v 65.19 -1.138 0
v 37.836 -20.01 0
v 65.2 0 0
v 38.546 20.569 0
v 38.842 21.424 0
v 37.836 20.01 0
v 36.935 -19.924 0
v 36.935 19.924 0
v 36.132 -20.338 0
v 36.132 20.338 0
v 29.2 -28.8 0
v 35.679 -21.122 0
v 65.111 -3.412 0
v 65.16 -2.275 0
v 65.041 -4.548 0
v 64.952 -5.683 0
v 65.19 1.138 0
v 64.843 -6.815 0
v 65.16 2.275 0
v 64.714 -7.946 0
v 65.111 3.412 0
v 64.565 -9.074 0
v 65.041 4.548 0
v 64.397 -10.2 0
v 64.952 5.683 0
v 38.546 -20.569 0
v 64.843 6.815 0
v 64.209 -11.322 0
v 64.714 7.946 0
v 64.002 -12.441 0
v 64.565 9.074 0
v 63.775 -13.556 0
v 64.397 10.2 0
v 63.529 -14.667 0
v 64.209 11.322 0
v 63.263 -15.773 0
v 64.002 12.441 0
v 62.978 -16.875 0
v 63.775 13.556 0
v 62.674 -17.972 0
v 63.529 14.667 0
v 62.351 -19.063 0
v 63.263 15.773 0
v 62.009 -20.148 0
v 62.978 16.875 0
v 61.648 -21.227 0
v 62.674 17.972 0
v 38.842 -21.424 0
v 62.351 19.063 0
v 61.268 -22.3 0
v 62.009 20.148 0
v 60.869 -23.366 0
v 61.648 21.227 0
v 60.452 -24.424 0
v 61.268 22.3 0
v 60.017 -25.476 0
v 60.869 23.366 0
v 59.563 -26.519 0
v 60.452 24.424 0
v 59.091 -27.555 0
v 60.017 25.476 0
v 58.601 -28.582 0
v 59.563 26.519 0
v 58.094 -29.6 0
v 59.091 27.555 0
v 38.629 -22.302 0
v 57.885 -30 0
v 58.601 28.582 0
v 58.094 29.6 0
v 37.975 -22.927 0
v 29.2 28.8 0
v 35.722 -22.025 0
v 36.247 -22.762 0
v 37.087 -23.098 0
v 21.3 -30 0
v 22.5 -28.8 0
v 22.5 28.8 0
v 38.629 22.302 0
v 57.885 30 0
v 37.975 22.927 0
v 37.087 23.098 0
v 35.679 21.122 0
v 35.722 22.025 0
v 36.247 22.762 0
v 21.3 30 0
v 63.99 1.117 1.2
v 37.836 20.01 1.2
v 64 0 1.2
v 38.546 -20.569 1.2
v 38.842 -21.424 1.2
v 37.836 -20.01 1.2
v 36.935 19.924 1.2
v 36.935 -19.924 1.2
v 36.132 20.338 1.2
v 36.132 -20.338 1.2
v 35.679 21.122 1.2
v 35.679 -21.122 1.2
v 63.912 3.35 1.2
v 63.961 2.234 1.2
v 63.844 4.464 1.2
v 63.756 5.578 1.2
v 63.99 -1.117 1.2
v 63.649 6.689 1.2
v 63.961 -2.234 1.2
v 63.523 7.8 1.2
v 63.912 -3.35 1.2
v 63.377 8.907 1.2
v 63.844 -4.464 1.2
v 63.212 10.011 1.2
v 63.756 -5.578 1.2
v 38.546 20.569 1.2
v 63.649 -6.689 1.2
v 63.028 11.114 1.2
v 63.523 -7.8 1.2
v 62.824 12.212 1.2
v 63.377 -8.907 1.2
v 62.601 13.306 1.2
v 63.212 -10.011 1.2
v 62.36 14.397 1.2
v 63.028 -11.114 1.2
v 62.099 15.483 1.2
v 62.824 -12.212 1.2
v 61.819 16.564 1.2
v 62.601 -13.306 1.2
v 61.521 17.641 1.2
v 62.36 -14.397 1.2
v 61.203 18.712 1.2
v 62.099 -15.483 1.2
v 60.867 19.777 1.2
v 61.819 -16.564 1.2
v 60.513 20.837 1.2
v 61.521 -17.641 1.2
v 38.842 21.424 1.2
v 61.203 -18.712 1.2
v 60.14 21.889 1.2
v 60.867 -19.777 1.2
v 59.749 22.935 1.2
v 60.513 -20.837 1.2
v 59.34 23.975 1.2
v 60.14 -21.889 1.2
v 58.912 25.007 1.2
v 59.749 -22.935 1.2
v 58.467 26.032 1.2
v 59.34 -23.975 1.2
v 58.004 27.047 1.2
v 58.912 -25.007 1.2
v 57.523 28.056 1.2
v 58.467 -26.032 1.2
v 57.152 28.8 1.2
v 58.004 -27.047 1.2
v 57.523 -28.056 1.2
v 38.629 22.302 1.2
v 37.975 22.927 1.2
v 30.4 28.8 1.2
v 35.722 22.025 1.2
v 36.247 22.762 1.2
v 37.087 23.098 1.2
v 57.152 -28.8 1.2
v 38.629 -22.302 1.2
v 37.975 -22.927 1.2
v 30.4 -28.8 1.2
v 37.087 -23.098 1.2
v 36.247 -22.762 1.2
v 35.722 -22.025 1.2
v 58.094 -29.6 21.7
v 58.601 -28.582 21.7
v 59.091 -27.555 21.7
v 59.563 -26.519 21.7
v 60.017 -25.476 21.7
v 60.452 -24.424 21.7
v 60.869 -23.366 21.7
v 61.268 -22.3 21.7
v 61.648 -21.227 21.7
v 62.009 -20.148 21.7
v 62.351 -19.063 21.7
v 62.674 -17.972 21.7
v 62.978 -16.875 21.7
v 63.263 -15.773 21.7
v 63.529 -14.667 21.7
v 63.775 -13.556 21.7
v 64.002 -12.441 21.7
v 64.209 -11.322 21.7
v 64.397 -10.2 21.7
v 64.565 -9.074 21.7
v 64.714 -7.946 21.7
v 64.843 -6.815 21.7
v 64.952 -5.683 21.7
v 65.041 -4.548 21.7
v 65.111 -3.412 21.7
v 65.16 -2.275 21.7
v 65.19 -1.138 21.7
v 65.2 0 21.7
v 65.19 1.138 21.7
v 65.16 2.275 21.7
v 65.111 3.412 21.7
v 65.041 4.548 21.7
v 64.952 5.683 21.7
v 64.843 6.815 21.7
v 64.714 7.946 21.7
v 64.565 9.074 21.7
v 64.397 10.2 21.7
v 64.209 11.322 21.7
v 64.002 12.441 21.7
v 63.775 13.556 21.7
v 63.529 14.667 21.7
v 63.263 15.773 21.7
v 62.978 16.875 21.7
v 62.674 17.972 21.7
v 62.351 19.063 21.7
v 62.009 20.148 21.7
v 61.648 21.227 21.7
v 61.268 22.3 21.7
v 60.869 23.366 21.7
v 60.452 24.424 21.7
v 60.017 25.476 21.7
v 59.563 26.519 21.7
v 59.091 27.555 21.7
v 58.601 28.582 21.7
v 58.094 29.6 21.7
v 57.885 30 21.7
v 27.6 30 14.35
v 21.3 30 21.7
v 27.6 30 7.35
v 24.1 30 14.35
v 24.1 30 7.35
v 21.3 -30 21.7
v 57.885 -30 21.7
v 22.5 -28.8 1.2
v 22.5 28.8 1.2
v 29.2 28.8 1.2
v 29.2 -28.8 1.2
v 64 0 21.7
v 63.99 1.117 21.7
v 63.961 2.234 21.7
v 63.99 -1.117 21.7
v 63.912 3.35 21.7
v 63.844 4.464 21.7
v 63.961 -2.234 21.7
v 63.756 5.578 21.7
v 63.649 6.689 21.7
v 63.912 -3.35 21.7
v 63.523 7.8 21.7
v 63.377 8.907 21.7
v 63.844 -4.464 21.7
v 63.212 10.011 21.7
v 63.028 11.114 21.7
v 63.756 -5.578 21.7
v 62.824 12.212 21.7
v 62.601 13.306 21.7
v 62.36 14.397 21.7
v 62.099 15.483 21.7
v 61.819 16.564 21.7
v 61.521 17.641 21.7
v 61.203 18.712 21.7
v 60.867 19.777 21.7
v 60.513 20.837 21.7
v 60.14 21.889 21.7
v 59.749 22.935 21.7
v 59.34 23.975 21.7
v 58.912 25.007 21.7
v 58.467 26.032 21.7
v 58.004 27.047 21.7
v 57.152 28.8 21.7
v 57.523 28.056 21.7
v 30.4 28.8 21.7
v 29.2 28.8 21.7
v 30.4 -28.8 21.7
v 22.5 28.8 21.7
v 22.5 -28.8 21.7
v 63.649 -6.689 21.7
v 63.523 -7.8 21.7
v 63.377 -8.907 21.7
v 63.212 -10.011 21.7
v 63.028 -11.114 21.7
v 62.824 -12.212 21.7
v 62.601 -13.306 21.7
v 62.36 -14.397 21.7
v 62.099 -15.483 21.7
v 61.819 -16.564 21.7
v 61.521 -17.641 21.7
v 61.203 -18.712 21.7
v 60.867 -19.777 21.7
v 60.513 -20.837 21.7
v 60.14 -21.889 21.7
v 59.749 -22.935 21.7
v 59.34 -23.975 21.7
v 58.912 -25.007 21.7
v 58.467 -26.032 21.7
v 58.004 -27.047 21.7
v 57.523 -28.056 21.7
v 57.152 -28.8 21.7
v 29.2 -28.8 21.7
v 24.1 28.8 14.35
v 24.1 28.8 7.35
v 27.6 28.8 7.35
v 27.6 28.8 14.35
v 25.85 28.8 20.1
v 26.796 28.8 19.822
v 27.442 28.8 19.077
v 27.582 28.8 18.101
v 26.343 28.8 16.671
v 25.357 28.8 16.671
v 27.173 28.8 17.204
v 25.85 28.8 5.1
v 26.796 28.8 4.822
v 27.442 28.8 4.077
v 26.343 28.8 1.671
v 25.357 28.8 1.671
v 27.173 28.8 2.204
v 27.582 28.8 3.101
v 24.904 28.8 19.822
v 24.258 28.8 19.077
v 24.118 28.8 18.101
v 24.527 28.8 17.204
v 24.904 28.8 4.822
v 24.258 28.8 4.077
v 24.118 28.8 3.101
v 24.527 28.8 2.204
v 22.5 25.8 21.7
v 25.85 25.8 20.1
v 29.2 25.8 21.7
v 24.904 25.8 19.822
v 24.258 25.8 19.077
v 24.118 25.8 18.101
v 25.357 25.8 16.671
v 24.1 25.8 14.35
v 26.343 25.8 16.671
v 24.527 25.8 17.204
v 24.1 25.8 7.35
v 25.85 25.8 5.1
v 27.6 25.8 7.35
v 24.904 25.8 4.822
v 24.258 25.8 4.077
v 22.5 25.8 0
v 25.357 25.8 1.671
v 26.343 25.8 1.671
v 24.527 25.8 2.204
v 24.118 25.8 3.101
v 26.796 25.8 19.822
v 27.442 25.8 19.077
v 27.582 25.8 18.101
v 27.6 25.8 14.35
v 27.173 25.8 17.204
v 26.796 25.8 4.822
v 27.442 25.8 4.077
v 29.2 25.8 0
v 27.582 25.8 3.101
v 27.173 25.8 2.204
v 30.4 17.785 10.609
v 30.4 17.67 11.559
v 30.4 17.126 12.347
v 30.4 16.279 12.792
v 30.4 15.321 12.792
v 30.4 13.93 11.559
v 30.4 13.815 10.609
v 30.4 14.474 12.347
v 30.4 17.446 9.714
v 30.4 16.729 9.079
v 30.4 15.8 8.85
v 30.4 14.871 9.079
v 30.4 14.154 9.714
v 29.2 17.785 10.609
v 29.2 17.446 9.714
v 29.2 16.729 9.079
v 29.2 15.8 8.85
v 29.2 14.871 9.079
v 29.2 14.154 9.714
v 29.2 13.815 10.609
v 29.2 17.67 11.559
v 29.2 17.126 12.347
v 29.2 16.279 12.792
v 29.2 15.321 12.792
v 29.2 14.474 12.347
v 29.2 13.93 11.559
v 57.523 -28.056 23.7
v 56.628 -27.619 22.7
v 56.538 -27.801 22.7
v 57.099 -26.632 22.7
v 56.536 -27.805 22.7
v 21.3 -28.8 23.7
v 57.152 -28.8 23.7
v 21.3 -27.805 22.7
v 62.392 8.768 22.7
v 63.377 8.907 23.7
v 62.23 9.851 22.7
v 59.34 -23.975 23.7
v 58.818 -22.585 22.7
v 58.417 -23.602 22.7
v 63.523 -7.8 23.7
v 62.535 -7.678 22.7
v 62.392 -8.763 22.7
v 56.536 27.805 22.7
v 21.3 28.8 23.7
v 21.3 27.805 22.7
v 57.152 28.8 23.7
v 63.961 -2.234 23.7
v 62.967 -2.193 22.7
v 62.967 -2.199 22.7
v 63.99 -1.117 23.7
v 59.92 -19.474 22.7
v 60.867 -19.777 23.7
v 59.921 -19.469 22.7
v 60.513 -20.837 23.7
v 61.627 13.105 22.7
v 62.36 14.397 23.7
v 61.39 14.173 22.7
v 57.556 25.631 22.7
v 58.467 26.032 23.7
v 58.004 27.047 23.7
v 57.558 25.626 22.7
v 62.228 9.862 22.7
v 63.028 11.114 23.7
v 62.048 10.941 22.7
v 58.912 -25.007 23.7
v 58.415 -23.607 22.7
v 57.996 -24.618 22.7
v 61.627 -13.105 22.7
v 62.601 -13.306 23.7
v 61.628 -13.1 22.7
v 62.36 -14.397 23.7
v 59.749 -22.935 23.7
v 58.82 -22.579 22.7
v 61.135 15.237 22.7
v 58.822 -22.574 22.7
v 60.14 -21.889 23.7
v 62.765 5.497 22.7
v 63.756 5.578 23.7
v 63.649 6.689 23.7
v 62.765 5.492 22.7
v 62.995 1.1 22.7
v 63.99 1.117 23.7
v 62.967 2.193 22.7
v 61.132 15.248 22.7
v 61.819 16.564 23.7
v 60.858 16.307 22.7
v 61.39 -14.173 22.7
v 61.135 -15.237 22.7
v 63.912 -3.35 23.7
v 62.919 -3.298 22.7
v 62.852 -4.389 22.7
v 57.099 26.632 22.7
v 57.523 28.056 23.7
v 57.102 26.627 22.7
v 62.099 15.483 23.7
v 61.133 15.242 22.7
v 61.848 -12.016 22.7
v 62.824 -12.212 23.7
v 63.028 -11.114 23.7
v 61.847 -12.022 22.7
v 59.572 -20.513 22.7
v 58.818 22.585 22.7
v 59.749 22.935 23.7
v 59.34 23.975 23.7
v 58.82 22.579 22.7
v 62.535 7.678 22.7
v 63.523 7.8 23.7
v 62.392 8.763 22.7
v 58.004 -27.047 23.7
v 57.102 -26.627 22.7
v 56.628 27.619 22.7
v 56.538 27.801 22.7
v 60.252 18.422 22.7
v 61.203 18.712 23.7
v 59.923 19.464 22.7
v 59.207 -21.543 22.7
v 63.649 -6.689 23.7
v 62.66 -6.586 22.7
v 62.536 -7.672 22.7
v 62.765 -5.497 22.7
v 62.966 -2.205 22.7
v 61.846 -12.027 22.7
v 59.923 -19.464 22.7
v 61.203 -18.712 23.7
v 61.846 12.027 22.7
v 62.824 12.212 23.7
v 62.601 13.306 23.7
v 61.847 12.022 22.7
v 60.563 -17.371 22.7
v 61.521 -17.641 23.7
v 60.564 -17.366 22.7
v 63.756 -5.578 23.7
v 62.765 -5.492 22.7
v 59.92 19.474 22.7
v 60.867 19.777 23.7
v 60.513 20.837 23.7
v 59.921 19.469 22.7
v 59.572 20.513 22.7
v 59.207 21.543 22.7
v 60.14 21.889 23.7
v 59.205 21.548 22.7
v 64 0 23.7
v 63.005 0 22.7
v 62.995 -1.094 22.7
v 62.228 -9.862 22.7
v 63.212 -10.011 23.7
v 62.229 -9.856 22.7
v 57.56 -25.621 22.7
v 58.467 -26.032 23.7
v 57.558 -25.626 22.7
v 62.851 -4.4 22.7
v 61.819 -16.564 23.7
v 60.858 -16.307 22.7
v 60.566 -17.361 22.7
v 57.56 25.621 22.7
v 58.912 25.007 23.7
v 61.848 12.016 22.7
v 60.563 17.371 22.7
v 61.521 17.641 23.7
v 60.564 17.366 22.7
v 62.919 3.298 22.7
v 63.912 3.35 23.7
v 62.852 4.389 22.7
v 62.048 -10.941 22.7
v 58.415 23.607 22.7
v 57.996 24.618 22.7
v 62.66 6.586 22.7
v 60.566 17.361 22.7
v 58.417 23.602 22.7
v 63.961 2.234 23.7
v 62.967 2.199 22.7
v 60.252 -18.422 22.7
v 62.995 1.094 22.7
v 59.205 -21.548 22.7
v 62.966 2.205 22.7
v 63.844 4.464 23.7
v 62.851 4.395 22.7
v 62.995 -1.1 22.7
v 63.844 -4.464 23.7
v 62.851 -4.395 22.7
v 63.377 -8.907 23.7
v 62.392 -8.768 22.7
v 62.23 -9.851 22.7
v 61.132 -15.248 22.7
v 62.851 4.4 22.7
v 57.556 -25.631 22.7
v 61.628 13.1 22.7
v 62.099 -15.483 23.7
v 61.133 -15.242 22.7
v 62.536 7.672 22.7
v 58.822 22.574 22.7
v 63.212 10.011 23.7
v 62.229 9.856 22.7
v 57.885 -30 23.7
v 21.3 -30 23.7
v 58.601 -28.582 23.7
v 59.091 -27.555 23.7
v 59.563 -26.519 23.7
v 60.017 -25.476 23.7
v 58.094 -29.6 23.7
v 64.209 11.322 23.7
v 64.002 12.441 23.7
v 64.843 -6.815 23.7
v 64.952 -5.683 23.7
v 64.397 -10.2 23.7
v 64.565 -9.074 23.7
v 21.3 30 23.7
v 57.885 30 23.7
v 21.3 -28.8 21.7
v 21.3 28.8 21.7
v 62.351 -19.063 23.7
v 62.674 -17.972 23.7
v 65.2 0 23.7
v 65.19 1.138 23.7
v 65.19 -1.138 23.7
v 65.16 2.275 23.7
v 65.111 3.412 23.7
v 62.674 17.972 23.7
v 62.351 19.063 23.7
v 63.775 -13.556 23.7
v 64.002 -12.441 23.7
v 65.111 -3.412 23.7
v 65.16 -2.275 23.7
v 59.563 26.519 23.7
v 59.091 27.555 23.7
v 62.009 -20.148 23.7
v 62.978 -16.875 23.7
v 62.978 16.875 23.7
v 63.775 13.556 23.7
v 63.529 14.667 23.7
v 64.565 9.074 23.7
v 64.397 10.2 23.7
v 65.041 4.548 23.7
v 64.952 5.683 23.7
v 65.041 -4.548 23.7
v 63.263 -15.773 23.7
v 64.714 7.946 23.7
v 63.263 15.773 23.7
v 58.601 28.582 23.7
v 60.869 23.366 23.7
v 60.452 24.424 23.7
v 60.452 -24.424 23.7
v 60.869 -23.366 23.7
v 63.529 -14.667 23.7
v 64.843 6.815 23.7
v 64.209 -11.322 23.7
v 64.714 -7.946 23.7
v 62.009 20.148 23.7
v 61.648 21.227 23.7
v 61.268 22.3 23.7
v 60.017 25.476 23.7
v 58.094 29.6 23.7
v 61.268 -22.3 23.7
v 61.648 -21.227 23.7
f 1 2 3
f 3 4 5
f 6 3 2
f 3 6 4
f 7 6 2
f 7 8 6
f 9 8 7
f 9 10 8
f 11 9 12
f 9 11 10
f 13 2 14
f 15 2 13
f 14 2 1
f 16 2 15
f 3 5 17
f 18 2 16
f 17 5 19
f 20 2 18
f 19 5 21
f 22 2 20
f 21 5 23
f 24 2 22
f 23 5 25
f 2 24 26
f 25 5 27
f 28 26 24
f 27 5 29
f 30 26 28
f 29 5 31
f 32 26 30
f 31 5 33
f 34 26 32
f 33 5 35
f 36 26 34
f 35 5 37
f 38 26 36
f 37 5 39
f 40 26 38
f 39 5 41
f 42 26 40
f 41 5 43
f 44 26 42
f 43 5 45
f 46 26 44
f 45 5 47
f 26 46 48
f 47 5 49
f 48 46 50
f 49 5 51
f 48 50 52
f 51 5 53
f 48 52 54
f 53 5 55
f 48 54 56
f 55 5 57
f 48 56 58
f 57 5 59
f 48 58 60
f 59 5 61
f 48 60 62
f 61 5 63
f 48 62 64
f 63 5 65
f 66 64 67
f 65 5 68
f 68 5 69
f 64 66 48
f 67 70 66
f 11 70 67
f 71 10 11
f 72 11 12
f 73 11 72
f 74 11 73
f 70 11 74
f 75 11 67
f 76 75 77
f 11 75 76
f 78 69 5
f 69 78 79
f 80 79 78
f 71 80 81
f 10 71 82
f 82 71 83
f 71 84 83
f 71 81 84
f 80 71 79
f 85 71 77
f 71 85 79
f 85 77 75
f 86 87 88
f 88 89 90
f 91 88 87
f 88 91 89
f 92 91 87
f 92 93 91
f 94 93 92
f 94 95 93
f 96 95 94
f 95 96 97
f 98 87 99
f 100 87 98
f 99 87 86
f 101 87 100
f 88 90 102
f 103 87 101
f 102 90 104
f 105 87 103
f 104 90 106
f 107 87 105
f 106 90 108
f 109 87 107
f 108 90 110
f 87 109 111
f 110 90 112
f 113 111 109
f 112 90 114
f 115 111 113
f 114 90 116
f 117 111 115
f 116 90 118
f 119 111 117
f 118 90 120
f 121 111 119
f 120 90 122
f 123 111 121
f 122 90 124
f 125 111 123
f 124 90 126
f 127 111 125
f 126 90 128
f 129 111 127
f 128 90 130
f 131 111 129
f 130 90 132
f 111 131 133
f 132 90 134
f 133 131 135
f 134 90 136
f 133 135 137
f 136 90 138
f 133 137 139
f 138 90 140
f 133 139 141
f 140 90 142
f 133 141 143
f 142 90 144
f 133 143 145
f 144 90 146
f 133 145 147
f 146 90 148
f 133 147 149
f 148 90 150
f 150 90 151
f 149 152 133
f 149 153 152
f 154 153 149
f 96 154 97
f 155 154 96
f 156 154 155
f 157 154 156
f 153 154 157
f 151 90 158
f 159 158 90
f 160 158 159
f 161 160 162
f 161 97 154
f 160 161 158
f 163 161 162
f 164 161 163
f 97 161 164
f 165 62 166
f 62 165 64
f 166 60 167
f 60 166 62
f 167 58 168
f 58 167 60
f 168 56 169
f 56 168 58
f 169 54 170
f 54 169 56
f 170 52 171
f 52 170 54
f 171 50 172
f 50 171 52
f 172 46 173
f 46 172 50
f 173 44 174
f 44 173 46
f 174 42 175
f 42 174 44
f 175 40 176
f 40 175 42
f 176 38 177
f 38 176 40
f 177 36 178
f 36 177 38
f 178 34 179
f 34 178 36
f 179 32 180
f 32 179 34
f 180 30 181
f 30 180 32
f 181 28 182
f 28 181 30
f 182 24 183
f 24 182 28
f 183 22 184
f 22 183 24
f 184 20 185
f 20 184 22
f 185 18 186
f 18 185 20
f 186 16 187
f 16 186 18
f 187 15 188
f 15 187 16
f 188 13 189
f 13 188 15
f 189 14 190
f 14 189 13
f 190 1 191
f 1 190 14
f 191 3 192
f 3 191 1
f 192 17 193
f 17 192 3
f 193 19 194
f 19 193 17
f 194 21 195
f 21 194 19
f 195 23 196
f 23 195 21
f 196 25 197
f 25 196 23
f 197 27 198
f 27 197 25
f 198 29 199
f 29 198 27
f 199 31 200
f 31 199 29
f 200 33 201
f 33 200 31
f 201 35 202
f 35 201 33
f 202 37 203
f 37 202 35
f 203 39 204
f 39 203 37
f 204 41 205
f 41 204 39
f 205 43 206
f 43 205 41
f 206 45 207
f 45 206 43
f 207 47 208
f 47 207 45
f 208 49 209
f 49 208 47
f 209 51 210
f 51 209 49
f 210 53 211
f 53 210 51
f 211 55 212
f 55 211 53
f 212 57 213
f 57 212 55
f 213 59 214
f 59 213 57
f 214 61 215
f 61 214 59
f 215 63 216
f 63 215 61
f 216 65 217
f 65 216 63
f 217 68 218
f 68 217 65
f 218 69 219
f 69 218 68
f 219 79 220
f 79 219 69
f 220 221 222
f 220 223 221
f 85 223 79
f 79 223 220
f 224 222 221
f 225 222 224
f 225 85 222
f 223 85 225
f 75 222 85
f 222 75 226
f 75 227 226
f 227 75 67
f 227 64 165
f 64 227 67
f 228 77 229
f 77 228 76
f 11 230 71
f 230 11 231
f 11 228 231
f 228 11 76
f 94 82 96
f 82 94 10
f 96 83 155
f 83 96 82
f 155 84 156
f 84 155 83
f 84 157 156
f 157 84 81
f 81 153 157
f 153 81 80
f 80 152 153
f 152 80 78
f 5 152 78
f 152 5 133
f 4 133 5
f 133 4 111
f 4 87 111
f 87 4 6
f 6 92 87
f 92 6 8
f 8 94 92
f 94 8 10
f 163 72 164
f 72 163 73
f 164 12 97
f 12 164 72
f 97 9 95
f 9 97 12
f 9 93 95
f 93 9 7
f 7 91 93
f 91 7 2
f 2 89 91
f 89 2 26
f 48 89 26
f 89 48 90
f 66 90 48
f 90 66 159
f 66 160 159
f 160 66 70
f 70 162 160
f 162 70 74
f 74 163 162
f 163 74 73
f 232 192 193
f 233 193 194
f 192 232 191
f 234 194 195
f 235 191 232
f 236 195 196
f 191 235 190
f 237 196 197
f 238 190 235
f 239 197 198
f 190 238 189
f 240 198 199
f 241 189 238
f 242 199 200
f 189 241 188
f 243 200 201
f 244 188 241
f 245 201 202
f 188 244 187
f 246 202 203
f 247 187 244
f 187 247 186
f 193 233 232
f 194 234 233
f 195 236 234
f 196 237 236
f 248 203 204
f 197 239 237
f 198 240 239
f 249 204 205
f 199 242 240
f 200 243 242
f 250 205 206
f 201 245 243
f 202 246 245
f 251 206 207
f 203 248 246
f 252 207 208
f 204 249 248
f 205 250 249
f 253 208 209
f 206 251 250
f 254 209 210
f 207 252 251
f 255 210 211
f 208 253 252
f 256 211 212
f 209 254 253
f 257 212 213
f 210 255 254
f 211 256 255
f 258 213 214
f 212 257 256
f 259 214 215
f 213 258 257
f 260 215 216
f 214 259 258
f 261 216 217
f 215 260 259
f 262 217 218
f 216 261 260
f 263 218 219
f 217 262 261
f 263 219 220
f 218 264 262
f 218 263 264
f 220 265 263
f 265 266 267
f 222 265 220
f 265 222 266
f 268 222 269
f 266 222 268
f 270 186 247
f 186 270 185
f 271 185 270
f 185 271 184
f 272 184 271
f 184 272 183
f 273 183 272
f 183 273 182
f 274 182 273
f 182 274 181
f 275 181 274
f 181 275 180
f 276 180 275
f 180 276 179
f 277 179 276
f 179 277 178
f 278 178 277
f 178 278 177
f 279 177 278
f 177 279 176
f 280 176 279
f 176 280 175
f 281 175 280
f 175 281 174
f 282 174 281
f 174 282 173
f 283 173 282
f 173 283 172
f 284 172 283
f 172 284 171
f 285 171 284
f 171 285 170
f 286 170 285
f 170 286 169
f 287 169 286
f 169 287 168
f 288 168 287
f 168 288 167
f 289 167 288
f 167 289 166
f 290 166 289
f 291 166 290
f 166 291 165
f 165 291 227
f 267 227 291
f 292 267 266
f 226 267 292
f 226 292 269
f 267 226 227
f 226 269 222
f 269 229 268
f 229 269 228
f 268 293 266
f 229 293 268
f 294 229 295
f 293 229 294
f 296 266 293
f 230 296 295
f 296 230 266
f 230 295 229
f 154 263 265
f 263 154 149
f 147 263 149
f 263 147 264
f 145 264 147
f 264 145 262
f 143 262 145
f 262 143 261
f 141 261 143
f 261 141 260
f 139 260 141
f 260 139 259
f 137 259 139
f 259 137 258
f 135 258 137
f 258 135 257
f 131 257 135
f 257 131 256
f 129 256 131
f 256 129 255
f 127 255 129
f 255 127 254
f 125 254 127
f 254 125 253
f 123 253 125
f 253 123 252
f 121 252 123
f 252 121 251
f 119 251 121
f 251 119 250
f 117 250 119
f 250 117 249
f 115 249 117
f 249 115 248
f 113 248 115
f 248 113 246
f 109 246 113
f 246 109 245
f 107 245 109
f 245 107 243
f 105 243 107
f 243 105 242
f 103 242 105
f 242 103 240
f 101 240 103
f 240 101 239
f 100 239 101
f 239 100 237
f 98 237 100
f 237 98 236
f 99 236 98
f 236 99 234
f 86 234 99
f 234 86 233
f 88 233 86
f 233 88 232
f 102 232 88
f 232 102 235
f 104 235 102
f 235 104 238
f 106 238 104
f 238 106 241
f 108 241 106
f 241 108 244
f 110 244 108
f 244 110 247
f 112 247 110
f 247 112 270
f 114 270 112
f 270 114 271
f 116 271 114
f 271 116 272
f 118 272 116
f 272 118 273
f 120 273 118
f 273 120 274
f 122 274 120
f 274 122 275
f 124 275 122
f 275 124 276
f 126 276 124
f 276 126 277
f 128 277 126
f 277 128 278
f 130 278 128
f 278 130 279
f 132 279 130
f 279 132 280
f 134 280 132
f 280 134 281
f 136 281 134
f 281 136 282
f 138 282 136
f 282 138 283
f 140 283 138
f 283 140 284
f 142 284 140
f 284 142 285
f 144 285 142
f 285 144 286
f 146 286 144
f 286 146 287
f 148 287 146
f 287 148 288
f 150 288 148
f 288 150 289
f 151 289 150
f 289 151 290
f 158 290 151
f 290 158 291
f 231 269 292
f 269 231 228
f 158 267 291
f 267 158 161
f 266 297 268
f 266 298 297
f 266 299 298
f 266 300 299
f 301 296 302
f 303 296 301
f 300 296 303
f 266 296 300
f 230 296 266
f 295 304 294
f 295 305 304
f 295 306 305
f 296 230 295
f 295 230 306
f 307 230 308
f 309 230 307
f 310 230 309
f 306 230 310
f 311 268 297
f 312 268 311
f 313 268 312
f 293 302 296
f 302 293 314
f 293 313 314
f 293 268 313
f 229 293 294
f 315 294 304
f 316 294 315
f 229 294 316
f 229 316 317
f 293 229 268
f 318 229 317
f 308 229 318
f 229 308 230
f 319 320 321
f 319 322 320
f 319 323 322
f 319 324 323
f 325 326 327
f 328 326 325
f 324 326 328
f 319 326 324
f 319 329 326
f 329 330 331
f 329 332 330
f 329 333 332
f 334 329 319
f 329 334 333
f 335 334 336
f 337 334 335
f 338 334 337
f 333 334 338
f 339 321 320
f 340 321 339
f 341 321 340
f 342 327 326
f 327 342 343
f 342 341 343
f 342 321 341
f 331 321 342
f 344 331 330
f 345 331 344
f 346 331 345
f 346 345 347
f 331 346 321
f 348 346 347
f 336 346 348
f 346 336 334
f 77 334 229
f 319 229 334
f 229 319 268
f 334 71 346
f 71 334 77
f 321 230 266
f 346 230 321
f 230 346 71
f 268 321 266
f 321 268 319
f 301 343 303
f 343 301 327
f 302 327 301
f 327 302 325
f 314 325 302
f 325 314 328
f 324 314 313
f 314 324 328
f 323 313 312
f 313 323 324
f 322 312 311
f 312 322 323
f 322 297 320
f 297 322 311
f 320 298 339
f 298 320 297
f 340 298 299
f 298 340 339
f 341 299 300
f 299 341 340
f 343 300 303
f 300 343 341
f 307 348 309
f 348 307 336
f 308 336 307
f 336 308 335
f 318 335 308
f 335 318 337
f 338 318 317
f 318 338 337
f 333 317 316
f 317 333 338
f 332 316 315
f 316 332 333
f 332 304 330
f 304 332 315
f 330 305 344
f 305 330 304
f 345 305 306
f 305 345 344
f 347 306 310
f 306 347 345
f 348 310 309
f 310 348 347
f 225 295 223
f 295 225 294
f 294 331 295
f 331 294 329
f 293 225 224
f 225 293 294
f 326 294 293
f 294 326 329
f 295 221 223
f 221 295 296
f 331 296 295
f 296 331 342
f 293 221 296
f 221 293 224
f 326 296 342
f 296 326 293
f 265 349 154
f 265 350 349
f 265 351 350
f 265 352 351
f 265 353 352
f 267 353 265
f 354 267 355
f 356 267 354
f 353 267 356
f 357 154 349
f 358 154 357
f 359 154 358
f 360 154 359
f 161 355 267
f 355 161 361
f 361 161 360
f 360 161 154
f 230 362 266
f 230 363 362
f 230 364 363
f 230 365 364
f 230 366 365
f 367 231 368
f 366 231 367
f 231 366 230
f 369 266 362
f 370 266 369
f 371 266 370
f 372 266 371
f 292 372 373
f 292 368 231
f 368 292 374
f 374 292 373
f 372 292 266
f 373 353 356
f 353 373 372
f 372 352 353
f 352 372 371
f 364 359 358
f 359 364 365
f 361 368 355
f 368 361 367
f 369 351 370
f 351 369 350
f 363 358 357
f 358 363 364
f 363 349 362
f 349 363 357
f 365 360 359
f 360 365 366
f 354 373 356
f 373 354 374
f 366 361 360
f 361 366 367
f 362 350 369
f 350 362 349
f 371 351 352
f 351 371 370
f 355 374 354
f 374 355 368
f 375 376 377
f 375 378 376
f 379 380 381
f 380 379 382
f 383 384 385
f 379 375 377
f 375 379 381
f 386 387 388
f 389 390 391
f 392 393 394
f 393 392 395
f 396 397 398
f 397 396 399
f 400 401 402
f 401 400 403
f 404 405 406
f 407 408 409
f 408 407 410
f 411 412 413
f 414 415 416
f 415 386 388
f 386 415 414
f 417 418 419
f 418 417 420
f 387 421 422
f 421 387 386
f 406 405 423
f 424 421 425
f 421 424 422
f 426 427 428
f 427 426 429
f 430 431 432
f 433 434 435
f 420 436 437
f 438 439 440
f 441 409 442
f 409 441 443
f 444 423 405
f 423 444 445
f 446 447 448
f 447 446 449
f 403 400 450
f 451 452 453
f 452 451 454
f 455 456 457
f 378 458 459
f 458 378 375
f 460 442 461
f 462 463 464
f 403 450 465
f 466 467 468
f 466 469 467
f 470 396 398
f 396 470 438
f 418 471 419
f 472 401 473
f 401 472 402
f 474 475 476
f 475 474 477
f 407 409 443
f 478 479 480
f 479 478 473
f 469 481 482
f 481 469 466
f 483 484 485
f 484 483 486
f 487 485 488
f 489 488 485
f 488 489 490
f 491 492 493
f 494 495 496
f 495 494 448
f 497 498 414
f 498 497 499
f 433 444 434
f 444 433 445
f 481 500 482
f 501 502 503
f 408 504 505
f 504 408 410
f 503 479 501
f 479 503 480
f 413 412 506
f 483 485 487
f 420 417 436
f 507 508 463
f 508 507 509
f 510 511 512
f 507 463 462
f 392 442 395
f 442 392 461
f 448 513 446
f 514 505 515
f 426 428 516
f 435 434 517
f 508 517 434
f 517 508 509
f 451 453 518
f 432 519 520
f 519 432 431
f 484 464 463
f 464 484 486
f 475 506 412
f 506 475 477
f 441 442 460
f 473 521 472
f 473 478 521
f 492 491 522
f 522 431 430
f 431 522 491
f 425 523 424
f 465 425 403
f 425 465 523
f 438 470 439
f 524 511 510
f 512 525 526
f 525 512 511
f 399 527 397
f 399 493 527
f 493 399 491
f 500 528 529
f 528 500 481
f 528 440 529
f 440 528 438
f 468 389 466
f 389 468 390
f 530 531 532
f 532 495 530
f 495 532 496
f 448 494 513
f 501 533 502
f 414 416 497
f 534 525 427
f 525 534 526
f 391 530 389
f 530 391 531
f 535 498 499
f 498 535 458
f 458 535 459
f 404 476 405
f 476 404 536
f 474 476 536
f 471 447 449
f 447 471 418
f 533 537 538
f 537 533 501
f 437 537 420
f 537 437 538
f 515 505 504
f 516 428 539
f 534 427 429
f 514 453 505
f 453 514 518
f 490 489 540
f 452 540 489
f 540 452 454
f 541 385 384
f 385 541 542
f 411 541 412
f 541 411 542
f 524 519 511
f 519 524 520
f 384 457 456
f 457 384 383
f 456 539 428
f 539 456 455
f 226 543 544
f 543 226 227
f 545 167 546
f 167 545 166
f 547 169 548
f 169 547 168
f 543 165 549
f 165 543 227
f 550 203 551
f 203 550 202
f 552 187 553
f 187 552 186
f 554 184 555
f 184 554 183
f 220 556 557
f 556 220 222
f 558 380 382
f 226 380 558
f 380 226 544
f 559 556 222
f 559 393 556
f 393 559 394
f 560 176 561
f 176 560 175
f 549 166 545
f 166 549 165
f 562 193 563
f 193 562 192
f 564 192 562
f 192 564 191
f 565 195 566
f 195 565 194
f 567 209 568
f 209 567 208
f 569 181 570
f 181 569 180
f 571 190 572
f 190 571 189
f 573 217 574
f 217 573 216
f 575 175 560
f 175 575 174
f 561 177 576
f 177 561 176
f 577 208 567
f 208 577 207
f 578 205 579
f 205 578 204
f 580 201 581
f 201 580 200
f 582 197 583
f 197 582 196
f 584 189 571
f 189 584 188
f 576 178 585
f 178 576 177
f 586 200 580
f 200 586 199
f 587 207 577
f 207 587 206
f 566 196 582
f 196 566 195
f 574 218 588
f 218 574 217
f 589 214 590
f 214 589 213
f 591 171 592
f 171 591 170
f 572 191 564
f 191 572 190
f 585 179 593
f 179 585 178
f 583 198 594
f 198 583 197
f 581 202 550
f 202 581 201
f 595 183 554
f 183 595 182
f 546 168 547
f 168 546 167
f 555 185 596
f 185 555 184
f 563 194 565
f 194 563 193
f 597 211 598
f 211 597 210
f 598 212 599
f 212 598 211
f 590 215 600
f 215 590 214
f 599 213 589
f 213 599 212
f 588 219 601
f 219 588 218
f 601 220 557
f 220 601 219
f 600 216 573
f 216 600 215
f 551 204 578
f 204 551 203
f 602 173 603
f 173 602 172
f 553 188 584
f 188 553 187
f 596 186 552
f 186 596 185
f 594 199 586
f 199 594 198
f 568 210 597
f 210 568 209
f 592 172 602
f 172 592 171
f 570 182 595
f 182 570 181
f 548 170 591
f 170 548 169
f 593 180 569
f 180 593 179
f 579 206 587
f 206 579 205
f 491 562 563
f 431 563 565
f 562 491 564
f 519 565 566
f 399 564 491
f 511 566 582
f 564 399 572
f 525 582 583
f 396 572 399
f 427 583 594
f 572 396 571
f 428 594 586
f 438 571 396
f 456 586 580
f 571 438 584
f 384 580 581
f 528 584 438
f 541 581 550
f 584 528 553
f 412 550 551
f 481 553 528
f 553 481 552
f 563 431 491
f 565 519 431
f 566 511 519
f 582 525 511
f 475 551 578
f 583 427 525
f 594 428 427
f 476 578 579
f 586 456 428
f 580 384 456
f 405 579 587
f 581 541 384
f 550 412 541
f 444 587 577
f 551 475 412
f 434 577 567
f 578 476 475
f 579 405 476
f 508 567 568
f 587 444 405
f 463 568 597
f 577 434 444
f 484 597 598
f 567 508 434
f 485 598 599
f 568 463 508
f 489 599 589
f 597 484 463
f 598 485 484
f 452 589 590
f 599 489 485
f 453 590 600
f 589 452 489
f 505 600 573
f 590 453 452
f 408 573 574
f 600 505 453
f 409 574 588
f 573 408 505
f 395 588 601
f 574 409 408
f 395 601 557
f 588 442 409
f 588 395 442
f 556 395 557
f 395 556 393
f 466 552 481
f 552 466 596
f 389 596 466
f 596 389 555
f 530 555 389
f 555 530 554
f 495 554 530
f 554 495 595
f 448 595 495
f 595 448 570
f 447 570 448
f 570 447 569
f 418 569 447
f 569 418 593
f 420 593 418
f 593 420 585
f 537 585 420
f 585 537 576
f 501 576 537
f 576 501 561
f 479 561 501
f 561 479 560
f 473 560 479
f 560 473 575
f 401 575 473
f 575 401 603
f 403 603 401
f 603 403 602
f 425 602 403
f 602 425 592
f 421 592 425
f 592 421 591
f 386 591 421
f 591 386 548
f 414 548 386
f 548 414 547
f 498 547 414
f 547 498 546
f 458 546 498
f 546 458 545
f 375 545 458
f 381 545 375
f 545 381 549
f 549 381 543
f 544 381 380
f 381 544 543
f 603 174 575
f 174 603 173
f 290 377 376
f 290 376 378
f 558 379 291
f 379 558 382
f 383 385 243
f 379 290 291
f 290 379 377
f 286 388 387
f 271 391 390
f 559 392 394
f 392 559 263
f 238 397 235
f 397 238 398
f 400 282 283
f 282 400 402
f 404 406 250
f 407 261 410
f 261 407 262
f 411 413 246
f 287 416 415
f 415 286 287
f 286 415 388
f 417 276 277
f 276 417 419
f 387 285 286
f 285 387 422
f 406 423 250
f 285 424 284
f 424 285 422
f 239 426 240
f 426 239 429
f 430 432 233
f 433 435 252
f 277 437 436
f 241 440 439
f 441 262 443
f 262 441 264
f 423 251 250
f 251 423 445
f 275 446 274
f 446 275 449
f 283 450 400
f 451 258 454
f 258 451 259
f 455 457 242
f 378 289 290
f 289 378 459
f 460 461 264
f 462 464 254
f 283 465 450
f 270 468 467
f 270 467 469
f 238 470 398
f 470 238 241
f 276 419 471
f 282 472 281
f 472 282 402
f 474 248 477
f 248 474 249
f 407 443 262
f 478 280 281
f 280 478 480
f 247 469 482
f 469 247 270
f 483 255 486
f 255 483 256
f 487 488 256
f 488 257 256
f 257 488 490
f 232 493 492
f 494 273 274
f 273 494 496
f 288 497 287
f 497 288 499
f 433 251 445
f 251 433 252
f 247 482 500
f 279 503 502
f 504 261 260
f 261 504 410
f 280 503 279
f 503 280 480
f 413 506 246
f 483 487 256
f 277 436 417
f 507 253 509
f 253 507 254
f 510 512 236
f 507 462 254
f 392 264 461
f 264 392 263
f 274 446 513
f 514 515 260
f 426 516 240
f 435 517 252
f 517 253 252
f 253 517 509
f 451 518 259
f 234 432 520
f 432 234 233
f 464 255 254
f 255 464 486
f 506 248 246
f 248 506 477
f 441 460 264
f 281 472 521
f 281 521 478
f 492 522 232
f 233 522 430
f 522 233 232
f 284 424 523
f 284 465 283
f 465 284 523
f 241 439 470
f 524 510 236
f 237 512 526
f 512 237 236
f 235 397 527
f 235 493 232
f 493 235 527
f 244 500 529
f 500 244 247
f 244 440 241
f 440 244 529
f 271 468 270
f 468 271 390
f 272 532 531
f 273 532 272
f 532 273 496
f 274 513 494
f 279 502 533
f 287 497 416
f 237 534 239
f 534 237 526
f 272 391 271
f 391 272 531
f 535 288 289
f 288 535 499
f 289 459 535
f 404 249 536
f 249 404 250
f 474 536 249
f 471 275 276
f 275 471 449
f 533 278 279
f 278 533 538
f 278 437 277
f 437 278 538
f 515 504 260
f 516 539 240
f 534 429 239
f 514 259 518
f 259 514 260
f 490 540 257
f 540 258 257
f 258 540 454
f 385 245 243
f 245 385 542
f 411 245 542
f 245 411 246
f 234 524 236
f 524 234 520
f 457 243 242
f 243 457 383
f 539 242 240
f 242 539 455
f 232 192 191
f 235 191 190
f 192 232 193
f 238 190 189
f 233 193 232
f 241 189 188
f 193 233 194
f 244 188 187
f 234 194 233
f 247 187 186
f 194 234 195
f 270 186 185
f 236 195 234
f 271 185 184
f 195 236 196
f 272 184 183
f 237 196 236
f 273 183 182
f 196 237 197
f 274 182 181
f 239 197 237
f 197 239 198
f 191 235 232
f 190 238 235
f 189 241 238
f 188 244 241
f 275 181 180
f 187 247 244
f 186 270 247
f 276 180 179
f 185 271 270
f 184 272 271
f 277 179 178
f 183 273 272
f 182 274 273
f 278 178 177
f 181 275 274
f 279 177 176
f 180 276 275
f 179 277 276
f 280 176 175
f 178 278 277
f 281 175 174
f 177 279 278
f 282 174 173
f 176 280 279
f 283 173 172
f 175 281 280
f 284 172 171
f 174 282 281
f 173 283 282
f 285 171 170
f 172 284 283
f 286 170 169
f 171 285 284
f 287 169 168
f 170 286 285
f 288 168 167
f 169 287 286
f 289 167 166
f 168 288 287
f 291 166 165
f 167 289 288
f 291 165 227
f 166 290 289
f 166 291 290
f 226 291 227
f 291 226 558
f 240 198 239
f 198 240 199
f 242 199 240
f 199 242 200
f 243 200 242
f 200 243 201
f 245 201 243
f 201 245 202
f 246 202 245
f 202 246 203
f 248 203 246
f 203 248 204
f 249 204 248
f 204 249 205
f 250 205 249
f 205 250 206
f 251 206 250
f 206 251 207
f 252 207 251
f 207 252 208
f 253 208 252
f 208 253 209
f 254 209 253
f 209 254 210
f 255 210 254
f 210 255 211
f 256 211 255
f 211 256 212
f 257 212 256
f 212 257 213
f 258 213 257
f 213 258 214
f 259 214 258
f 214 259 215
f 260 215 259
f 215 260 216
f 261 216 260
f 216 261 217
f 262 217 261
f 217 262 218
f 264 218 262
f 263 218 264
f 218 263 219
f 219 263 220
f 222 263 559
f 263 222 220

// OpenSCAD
$fs=1/1;
$fa=1/1;
bsl=1/100;

part="enclosure";//[bottom,top,enclosure,battery,cover,camera_mount,NOSTL_assembly]

pcb_height=1; // thickness of the board where the led is mounted
led_height=1; // how hight led protrudes above the board surface
pcb_size=[30.5,28.4]; //distances between mount edges of the board (board itself is bigger)

slack=0.2; //extra space aroung led mounting features
hook_width=12; //width of led mounting features
wall=1.2; //horizontal wall thickness
vert_wall=1.2; //vertical wall thickness
lip=1; //thickness of the frame around led
insert_w=3.2; //diameters of holes, same for threaded inserts and for screws to go through

n_leds=6; //number of leds
led_offset=43; //offset of led center from origin. Later change to calculated value

id=45; //inner diameter of the ring, without walls. Later calculate the value from pcb size
od=128; //outer diameter

sw_dist=15; //distance between switch mounting points
sw_depth=3; //distance to mounting surface
sw_rect=[7,3.5]; //cutout for slider
sw_hole=3.5; //mounting hole diameter
sw_wall=1.6; //min distance from any hole to mounting surface side
sw_length=sw_dist+sw_hole+2*sw_wall; //larger length of mounting surface
sw_width=2*sw_wall+max([sw_hole,sw_rect[1]]); //shorter side of mounting surface

bp_length=60; //outer length of battery pack enclusire, longer for longer batteries
bp_height=sw_length; //battery pack length, currently defined by switch, can be bigger
bp_width=(od-id)/2+2*vert_wall; //width of enclosure, currently max, later make smaller
bp_offset=id/2-vert_wall; //how close to center the battery compartment starts

dt_h=2; //total height of dovetatil profile
dt_offset=1; //dovetailness of dovetail, 1mm offset on 1mm half-height is 45 degrees
dt_slack=0.0; //wiggle room in horizontal direction

wire=4; //holes for wires
tweak_wire=3; //manual position adjustment of hole for power to leds
wire_offset=id/2+wire/2+vert_wall+slack+tweak_wire; //distance of hole from origin
four_wire_offset_tweak=8; //manual position adjustment of hole for battery cables
four_wire_offset=bp_length-vert_wall-wire/2-sw_depth-four_wire_offset_tweak;

module hook() { //holds led from one side
  hull() {
    translate([-hook_width/2,0,0]) cube([hook_width,vert_wall,pcb_height+led_height]);
    scale([1,1,0]) translate([-hook_width/2,0,0]) cube([hook_width,vert_wall+pcb_height+led_height,1]);
  }
}

module bottom_holder() { //holds one led from 4 sides
  rot=[0,90,180,270];
  shift=[pcb_size[1]/2,pcb_size[0]/2,pcb_size[1]/2,pcb_size[0]/2];
  for (i=[0:1:3]) rotate([0,0,rot[i]]) translate([0,shift[i]+slack,0]) hook();
}

module bottom() {
  linear_extrude(height=wall) { //ring shaped area, large back surface
    difference() {
      circle(d=od);
      circle(d=id);
      for (a=[360/n_leds:360/n_leds:360]) {
        rotate([0,0,a]) translate([led_offset,0,0]) square(pcb_size-2*[lip,lip],center=true); //vent squares
        rotate([0,0,a+360/(2*n_leds)]) translate([led_offset,0,0]) circle(d=insert_w+bsl); //screw holes
      }
      rotate(-180/n_leds) translate([wire_offset,0]) circle(d=wire); //single hole for wire
    }
  }
  for (a=[360/n_leds:360/n_leds:360]) { //stuff above ring surface
    rotate([0,0,a]) translate([led_offset,0,wall]) bottom_holder(); //stops lateral motion of led
    rotate([0,0,a+360/(2*n_leds)]) translate([led_offset,0,0]) linear_extrude(wall+pcb_height+led_height) {
      *difference() { // protrusions for thread inserts, here deactivated, because present on other side
        circle(d=insert_w+2*wall);
        circle(d=insert_w);
      }
    }
  }
  linear_extrude(height=wall+pcb_height+led_height) { //ring walls around inner circle and outer circle
    difference() { //outer wall
      circle(d=od+2*vert_wall);
      circle(d=od);
    }
    difference() { //inner wall
      circle(d=id);
      circle(d=id-2*vert_wall);
    }
  }
}

module top() {
  linear_extrude(wall) { //ring shaped area, largest front surface
    difference() {
      circle(d=od+2*vert_wall);
      circle(d=id-2*vert_wall);
      for (a=[360/n_leds:360/n_leds:360]) {
        rotate(a) translate([led_offset,0]) square(pcb_size-2*[lip,lip],center=true); //led cutouts
        rotate(a+360/(2*n_leds)) translate([led_offset,0]) circle(d=insert_w+bsl); //screw holes
      }
    }
  }
  translate([0,0,wall]) linear_extrude(led_height) { //lifted frames around leds
    for (a=[360/n_leds:360/n_leds:360]) {
      rotate(a) translate([led_offset,0]) {
        difference() {
          square(pcb_size-2*[slack,slack],center=true);
          square(pcb_size-2*[lip,lip],center=true);
        }
      }
    }
  }
  translate([0,0,wall]) linear_extrude(pcb_height+led_height) {
    for (a=[180/n_leds:360/n_leds:360]) { // protrusions for thread inserts
      rotate(a) translate([led_offset,0]) {
        difference() { 
          circle(d=insert_w+2*wall);
          circle(d=insert_w);
        }
      }
    }
  }
  linear_extrude(wall+pcb_height+led_height) { //ring walls around inner circle and outer circle
    difference() { //outer wall
      circle(d=od-2*slack);
      circle(d=od-2*slack-2*vert_wall);
    }
    difference() { //inner wall
      circle(d=id+2*slack+2*vert_wall);
      circle(d=id+2*slack);
    }
  }
}

module add_switch(x,y,z,a) { //module for placing switch mounting geometry on child
  difference() {
    union() { //add features
      children();
      translate([x,y,z]) rotate([0,-90,a]) linear_extrude(sw_depth,convexity=6) { //mounting geometry
        difference() {
          square([sw_length,sw_width],center=true);
          translate([sw_dist/2,0]) circle(d=sw_hole);
          translate([-sw_dist/2,0]) circle(d=sw_hole);
        }
      }
    } //subtract feature
    translate([x,y,z]) rotate([0,-90,a]) cube([sw_rect[0],sw_rect[1],sw_dist*2+bsl],center=true); //hole for switching
  }
}

module enclosure_shape() { //footprint of a electronics compartment
  intersection() {
    translate([bp_offset,-bp_length/2]) square([bp_width,bp_length]);
    difference() {
      circle(d=od+2*vert_wall);
      circle(d=id-2*vert_wall);
    }
  }
}

module enclosure_raw() { //base shape for enclosure, no wall, no switch related features
  linear_extrude(wall) { //bottom wall for mounting
    difference() {
      enclosure_shape();
      for (a=[360/n_leds:360/n_leds:360]) {
        rotate(a+360/(2*n_leds)) translate([led_offset,0]) circle(d=insert_w+bsl); //screw holes
      }
      rotate(-180/n_leds) translate([wire_offset,0]) circle(d=wire); //single hole for power wire
      translate([bp_offset+wall,-bp_length/2+wall]) {
        square([sw_width,bp_length-2*wall]); //decided to have this opening for ease of mounting everything
      }
    }
  }
  linear_extrude(bp_height,convexity=4) { //main walls of enclosure
    difference() {
      enclosure_shape();
      offset(r=-vert_wall) enclosure_shape();
    }
  }
}

module enclosure() { //enclosure with all features
  add_switch(bp_offset+sw_width/2+vert_wall,bp_length/2-vert_wall,bp_height/2,90) enclosure_raw();
  translate([bp_offset+sw_width+vert_wall,-bp_length/2,0]) difference() { //in-between-wall
    cube([vert_wall,bp_length,bp_height]);
    translate([vert_wall/2,four_wire_offset,bp_height/2]) rotate([0,90,0]) cylinder(d=wire,h=wall+bsl,center=true);
  }
  translate([0,0,bp_height+dt_h/2]) for (m=[0,1]) mirror([0,0,m]) difference() { //dovetail feature
    linear_extrude(dt_h/2) enclosure_shape(); //subtract from solid shape to form walls
    for (tr=[0,-10]) translate([tr,0,0]) hull() { //extended with translate x -10 to make longer for opening
      linear_extrude(bsl,center=true) offset(r=-vert_wall-dt_offset)enclosure_shape();
      translate([0,0,dt_h/2]) linear_extrude(bsl) offset(r=-vert_wall)enclosure_shape();
    }
  }
}

module cover() { //dovetail cover
  intersection() { //cut to shape to form vertical wall where it's cut
    linear_extrude(dt_h,center=true) enclosure_shape();
    for (tr=[0,-10]) translate([tr,0,0]) for (m=[0,1]) mirror([0,0,m]) hull() { //elongate in x dir with translate
      linear_extrude(bsl) offset(r=-vert_wall-dt_offset-dt_slack) enclosure_shape();
      translate([0,0,dt_h/2-bsl]) linear_extrude(bsl) offset(r=-vert_wall-dt_slack) enclosure_shape();
    }
  }
}

module battery() { //isolating tubes to make battery look safer lol
  diam=14; //cell diameter
  len=40; //cell length
  wall=0.8; //wall thickness
  wire=2; //wire diameter (better oversize)
  module bat_cs() { //cross-section of 2 batteries and 2 wires
    offset=sqrt((diam/2+wall+wire/2)^2-(diam/2+wall/2)^2);
    translate([-diam/2-wall/2,0]) circle(d=diam);
    translate([diam/2+wall/2,0]) circle(d=diam);
    translate([0,offset]) circle(d=wire);
    translate([0,-offset]) circle(d=wire);
  }
  linear_extrude(len, convexity=6) { //form walls with subtracting battery cross section from its offset version
    difference() { 
      offset(r=wall) bat_cs();
      bat_cs();
    }
  }
}

module camera_mount() { //very ugly camera-specific module
  x_offset=-29; //offset of mounting thread from origin
  y_offset=-20;
  z_offset=50;
  screw=8; //screw thread
  add_depth=12; //size of camera plate
  add_width=20;
  add_mount=3; //additional material around mount holes
  linear_extrude(wall) difference() {
    for (i=[1:1:3]) hull() {
      rotate(180/n_leds+i*360/n_leds) translate([led_offset,0]) circle(d=2*add_mount+insert_w);
      rotate(180/n_leds+(i+1)*360/n_leds) translate([led_offset,0]) circle(d=2*add_mount+insert_w);
    }
    for (i=[1:1:4]) rotate(180/n_leds+i*360/n_leds) translate([led_offset,0]) circle(d=insert_w);
  }
  difference() {
    hull() {
      translate([x_offset,y_offset,z_offset]) cube([1,add_width*2,add_depth*2],center=true);
      rotate(180/n_leds+2*360/n_leds) translate([led_offset,0,wall]) cylinder(d=2*add_mount+insert_w,h=bsl);
      rotate(180/n_leds+(2+1)*360/n_leds) translate([led_offset,0,wall]) cylinder(d=2*add_mount+insert_w,h=bsl);
    }
    rotate(180/n_leds+2*360/n_leds) translate([led_offset,0,wall]) cylinder(d=2*insert_w,h=z_offset);
    rotate(180/n_leds+(2+1)*360/n_leds) translate([led_offset,0,wall]) cylinder(d=2*insert_w,h=z_offset);
    translate([x_offset,y_offset,z_offset]) rotate([0,90,0])cylinder(d=screw,h=100,center=true);
    }
}

if (part=="top") top();
if (part=="bottom") bottom();
if (part=="battery") battery();
if (part=="enclosure") enclosure();
if (part=="cover") cover();
if (part=="camera_mount") camera_mount();
if (part=="NOSTL_assembly") {
  difference() {
    union() {
      bottom();
      translate([0,0,6]) mirror([0,0,1]) top();
    }
  rotate(30)cube([100,100,100]);
  }
}
